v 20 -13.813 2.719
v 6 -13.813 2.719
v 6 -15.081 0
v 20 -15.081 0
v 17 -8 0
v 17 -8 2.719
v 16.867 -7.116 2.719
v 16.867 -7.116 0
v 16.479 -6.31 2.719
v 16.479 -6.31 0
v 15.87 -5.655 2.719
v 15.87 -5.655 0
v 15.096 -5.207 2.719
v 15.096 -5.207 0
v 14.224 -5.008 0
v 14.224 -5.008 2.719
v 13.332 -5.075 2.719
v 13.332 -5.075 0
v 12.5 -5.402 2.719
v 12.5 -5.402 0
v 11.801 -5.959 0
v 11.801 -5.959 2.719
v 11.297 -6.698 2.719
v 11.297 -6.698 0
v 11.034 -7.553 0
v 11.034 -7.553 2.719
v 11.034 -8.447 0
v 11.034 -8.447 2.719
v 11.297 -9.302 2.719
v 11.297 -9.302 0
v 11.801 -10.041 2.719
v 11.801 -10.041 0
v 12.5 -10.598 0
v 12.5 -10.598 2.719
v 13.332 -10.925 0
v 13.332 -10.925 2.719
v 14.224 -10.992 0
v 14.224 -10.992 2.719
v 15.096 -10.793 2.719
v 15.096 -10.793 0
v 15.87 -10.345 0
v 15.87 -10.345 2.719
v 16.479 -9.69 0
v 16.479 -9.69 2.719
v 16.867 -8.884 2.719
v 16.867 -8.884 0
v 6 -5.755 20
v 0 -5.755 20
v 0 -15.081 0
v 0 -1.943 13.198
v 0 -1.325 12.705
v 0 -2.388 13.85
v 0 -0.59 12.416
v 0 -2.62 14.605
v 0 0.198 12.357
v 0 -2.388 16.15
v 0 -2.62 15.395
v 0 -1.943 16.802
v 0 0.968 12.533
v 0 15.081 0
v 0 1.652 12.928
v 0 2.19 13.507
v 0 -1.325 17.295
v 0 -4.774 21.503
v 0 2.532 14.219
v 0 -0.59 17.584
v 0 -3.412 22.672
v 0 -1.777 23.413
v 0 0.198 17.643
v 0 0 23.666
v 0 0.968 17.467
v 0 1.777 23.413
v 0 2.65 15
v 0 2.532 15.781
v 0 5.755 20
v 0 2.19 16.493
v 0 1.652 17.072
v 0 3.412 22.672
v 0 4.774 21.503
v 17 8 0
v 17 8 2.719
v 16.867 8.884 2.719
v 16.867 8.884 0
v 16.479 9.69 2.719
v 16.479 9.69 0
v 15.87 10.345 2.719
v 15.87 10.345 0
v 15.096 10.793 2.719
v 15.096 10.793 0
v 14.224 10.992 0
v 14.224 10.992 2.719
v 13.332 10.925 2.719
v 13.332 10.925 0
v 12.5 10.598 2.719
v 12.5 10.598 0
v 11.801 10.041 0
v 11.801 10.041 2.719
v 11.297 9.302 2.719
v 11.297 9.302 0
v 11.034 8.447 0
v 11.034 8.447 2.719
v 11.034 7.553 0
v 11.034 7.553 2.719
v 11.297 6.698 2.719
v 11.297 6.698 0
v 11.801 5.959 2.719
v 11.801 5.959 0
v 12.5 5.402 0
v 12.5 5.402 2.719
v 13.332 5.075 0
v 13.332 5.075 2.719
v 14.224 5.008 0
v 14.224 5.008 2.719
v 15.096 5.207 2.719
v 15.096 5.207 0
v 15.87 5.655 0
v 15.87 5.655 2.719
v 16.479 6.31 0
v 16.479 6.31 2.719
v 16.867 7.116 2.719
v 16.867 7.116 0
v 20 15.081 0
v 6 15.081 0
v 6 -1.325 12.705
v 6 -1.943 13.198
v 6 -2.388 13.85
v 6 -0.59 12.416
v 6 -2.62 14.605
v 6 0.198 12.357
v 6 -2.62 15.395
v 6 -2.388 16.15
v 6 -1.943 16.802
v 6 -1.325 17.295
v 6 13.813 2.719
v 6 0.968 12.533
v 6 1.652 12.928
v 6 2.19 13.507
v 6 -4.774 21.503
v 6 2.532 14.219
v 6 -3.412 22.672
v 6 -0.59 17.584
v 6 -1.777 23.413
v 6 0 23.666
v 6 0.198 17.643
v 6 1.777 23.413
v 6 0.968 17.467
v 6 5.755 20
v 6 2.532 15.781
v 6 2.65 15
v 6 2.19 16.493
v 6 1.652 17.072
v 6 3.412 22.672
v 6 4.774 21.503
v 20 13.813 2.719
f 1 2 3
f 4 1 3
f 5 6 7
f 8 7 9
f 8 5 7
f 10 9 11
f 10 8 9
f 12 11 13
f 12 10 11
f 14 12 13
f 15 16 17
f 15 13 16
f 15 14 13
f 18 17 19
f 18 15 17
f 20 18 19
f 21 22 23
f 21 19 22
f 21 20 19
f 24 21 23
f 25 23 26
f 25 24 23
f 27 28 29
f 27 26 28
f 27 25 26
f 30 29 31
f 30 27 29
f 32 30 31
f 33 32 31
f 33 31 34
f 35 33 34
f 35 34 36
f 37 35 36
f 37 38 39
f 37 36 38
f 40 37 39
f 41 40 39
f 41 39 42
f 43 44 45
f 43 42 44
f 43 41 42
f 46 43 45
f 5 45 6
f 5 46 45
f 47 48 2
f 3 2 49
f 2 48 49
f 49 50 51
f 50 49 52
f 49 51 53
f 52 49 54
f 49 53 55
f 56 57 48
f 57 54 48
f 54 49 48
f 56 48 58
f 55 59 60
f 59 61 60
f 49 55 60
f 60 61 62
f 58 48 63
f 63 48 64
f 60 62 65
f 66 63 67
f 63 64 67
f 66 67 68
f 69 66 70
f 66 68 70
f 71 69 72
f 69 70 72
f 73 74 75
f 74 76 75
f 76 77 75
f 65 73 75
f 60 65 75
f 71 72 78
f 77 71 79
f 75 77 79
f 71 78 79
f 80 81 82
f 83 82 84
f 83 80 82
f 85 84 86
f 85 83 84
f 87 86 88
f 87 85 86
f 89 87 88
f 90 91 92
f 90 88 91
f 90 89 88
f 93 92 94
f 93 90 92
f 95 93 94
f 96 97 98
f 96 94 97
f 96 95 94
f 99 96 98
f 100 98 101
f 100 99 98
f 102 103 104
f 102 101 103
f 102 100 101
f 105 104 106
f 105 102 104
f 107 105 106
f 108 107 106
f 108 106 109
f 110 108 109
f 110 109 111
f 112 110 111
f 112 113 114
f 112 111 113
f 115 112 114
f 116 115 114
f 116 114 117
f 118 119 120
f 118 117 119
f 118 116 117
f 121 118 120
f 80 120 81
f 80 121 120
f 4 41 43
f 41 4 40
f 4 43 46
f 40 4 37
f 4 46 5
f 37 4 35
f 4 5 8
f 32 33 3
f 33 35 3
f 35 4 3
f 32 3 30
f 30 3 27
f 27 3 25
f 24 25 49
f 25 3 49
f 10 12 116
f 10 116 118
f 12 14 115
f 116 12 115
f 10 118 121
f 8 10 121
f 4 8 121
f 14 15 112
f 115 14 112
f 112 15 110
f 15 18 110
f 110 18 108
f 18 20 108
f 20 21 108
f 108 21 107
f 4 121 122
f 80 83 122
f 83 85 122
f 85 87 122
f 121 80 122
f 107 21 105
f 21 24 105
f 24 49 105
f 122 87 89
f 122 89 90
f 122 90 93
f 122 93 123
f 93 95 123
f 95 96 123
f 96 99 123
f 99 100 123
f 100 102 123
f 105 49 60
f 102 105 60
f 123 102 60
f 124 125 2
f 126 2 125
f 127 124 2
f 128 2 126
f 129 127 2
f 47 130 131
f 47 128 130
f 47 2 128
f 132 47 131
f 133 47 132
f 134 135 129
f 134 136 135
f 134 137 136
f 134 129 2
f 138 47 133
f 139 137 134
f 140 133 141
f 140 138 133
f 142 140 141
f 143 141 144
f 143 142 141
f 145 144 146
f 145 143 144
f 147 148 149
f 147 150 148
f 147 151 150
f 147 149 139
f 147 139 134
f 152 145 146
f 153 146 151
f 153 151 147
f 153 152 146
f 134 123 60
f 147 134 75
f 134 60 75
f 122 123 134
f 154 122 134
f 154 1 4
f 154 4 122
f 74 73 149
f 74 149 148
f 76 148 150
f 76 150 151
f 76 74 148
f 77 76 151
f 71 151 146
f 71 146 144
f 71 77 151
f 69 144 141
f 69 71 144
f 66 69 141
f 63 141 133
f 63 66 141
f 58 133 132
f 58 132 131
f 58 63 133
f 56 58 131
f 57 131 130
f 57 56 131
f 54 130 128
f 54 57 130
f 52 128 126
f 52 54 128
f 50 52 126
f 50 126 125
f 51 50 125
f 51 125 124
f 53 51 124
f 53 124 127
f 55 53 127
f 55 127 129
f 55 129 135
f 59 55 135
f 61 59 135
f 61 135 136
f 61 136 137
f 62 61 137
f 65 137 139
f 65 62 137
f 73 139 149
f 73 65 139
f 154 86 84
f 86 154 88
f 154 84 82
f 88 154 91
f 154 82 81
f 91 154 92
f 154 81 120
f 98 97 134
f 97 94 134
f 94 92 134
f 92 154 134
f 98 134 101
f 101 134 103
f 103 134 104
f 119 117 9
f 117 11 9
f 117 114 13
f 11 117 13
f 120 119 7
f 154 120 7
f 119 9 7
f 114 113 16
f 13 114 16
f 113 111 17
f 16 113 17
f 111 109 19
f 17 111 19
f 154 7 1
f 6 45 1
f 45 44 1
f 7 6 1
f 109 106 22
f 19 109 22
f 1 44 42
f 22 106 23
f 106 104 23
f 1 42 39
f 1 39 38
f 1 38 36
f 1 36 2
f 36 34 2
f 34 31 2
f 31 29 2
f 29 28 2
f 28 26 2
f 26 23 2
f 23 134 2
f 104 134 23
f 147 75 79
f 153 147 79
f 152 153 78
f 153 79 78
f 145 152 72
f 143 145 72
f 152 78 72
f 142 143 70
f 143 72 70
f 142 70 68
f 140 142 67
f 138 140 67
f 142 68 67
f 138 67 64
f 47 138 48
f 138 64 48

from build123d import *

# Parameters (mm, degrees)
F0_R     = 2.65
F1_DEPTH = 6
F3_DEPTH = 20
F4_R     = 3
F5_DEPTH = 25.4


with BuildPart() as f1:
    # F0 (on Right) → F1 (new body)
    with BuildSketch(Plane.YZ):
        with BuildLine():
            Line((-5.755054, 20), (-15.081208, 0))
            Line((-15.081208, 0), (0, 0))
            Line((0, 0), (15.081208, 0))
            Line((15.081208, 0), (5.755054, 20))
            ThreePointArc((5.755054, 20), (0, 23.666374), (-5.755054, 20))
        make_face()
        with Locations((0, 15)):
            Circle(F0_R, mode=Mode.SUBTRACT)
    extrude(amount=F1_DEPTH)

    # F2 (on Right) → F3 (join)
    with BuildSketch(Plane.YZ):
        Polygon((-13.813353, 2.718923), (-15.081208, 0), (15.081208, 0), (13.813353, 2.718923), align=None)
    extrude(amount=F3_DEPTH)

    # F4 (on Top) → F5 (cut)
    with BuildSketch(Plane.XY):
        with Locations((14, -8)):
            Circle(F4_R)
        with Locations((14, 8)):
            Circle(F4_R)
    extrude(amount=F5_DEPTH, mode=Mode.SUBTRACT)


solid = f1.part
